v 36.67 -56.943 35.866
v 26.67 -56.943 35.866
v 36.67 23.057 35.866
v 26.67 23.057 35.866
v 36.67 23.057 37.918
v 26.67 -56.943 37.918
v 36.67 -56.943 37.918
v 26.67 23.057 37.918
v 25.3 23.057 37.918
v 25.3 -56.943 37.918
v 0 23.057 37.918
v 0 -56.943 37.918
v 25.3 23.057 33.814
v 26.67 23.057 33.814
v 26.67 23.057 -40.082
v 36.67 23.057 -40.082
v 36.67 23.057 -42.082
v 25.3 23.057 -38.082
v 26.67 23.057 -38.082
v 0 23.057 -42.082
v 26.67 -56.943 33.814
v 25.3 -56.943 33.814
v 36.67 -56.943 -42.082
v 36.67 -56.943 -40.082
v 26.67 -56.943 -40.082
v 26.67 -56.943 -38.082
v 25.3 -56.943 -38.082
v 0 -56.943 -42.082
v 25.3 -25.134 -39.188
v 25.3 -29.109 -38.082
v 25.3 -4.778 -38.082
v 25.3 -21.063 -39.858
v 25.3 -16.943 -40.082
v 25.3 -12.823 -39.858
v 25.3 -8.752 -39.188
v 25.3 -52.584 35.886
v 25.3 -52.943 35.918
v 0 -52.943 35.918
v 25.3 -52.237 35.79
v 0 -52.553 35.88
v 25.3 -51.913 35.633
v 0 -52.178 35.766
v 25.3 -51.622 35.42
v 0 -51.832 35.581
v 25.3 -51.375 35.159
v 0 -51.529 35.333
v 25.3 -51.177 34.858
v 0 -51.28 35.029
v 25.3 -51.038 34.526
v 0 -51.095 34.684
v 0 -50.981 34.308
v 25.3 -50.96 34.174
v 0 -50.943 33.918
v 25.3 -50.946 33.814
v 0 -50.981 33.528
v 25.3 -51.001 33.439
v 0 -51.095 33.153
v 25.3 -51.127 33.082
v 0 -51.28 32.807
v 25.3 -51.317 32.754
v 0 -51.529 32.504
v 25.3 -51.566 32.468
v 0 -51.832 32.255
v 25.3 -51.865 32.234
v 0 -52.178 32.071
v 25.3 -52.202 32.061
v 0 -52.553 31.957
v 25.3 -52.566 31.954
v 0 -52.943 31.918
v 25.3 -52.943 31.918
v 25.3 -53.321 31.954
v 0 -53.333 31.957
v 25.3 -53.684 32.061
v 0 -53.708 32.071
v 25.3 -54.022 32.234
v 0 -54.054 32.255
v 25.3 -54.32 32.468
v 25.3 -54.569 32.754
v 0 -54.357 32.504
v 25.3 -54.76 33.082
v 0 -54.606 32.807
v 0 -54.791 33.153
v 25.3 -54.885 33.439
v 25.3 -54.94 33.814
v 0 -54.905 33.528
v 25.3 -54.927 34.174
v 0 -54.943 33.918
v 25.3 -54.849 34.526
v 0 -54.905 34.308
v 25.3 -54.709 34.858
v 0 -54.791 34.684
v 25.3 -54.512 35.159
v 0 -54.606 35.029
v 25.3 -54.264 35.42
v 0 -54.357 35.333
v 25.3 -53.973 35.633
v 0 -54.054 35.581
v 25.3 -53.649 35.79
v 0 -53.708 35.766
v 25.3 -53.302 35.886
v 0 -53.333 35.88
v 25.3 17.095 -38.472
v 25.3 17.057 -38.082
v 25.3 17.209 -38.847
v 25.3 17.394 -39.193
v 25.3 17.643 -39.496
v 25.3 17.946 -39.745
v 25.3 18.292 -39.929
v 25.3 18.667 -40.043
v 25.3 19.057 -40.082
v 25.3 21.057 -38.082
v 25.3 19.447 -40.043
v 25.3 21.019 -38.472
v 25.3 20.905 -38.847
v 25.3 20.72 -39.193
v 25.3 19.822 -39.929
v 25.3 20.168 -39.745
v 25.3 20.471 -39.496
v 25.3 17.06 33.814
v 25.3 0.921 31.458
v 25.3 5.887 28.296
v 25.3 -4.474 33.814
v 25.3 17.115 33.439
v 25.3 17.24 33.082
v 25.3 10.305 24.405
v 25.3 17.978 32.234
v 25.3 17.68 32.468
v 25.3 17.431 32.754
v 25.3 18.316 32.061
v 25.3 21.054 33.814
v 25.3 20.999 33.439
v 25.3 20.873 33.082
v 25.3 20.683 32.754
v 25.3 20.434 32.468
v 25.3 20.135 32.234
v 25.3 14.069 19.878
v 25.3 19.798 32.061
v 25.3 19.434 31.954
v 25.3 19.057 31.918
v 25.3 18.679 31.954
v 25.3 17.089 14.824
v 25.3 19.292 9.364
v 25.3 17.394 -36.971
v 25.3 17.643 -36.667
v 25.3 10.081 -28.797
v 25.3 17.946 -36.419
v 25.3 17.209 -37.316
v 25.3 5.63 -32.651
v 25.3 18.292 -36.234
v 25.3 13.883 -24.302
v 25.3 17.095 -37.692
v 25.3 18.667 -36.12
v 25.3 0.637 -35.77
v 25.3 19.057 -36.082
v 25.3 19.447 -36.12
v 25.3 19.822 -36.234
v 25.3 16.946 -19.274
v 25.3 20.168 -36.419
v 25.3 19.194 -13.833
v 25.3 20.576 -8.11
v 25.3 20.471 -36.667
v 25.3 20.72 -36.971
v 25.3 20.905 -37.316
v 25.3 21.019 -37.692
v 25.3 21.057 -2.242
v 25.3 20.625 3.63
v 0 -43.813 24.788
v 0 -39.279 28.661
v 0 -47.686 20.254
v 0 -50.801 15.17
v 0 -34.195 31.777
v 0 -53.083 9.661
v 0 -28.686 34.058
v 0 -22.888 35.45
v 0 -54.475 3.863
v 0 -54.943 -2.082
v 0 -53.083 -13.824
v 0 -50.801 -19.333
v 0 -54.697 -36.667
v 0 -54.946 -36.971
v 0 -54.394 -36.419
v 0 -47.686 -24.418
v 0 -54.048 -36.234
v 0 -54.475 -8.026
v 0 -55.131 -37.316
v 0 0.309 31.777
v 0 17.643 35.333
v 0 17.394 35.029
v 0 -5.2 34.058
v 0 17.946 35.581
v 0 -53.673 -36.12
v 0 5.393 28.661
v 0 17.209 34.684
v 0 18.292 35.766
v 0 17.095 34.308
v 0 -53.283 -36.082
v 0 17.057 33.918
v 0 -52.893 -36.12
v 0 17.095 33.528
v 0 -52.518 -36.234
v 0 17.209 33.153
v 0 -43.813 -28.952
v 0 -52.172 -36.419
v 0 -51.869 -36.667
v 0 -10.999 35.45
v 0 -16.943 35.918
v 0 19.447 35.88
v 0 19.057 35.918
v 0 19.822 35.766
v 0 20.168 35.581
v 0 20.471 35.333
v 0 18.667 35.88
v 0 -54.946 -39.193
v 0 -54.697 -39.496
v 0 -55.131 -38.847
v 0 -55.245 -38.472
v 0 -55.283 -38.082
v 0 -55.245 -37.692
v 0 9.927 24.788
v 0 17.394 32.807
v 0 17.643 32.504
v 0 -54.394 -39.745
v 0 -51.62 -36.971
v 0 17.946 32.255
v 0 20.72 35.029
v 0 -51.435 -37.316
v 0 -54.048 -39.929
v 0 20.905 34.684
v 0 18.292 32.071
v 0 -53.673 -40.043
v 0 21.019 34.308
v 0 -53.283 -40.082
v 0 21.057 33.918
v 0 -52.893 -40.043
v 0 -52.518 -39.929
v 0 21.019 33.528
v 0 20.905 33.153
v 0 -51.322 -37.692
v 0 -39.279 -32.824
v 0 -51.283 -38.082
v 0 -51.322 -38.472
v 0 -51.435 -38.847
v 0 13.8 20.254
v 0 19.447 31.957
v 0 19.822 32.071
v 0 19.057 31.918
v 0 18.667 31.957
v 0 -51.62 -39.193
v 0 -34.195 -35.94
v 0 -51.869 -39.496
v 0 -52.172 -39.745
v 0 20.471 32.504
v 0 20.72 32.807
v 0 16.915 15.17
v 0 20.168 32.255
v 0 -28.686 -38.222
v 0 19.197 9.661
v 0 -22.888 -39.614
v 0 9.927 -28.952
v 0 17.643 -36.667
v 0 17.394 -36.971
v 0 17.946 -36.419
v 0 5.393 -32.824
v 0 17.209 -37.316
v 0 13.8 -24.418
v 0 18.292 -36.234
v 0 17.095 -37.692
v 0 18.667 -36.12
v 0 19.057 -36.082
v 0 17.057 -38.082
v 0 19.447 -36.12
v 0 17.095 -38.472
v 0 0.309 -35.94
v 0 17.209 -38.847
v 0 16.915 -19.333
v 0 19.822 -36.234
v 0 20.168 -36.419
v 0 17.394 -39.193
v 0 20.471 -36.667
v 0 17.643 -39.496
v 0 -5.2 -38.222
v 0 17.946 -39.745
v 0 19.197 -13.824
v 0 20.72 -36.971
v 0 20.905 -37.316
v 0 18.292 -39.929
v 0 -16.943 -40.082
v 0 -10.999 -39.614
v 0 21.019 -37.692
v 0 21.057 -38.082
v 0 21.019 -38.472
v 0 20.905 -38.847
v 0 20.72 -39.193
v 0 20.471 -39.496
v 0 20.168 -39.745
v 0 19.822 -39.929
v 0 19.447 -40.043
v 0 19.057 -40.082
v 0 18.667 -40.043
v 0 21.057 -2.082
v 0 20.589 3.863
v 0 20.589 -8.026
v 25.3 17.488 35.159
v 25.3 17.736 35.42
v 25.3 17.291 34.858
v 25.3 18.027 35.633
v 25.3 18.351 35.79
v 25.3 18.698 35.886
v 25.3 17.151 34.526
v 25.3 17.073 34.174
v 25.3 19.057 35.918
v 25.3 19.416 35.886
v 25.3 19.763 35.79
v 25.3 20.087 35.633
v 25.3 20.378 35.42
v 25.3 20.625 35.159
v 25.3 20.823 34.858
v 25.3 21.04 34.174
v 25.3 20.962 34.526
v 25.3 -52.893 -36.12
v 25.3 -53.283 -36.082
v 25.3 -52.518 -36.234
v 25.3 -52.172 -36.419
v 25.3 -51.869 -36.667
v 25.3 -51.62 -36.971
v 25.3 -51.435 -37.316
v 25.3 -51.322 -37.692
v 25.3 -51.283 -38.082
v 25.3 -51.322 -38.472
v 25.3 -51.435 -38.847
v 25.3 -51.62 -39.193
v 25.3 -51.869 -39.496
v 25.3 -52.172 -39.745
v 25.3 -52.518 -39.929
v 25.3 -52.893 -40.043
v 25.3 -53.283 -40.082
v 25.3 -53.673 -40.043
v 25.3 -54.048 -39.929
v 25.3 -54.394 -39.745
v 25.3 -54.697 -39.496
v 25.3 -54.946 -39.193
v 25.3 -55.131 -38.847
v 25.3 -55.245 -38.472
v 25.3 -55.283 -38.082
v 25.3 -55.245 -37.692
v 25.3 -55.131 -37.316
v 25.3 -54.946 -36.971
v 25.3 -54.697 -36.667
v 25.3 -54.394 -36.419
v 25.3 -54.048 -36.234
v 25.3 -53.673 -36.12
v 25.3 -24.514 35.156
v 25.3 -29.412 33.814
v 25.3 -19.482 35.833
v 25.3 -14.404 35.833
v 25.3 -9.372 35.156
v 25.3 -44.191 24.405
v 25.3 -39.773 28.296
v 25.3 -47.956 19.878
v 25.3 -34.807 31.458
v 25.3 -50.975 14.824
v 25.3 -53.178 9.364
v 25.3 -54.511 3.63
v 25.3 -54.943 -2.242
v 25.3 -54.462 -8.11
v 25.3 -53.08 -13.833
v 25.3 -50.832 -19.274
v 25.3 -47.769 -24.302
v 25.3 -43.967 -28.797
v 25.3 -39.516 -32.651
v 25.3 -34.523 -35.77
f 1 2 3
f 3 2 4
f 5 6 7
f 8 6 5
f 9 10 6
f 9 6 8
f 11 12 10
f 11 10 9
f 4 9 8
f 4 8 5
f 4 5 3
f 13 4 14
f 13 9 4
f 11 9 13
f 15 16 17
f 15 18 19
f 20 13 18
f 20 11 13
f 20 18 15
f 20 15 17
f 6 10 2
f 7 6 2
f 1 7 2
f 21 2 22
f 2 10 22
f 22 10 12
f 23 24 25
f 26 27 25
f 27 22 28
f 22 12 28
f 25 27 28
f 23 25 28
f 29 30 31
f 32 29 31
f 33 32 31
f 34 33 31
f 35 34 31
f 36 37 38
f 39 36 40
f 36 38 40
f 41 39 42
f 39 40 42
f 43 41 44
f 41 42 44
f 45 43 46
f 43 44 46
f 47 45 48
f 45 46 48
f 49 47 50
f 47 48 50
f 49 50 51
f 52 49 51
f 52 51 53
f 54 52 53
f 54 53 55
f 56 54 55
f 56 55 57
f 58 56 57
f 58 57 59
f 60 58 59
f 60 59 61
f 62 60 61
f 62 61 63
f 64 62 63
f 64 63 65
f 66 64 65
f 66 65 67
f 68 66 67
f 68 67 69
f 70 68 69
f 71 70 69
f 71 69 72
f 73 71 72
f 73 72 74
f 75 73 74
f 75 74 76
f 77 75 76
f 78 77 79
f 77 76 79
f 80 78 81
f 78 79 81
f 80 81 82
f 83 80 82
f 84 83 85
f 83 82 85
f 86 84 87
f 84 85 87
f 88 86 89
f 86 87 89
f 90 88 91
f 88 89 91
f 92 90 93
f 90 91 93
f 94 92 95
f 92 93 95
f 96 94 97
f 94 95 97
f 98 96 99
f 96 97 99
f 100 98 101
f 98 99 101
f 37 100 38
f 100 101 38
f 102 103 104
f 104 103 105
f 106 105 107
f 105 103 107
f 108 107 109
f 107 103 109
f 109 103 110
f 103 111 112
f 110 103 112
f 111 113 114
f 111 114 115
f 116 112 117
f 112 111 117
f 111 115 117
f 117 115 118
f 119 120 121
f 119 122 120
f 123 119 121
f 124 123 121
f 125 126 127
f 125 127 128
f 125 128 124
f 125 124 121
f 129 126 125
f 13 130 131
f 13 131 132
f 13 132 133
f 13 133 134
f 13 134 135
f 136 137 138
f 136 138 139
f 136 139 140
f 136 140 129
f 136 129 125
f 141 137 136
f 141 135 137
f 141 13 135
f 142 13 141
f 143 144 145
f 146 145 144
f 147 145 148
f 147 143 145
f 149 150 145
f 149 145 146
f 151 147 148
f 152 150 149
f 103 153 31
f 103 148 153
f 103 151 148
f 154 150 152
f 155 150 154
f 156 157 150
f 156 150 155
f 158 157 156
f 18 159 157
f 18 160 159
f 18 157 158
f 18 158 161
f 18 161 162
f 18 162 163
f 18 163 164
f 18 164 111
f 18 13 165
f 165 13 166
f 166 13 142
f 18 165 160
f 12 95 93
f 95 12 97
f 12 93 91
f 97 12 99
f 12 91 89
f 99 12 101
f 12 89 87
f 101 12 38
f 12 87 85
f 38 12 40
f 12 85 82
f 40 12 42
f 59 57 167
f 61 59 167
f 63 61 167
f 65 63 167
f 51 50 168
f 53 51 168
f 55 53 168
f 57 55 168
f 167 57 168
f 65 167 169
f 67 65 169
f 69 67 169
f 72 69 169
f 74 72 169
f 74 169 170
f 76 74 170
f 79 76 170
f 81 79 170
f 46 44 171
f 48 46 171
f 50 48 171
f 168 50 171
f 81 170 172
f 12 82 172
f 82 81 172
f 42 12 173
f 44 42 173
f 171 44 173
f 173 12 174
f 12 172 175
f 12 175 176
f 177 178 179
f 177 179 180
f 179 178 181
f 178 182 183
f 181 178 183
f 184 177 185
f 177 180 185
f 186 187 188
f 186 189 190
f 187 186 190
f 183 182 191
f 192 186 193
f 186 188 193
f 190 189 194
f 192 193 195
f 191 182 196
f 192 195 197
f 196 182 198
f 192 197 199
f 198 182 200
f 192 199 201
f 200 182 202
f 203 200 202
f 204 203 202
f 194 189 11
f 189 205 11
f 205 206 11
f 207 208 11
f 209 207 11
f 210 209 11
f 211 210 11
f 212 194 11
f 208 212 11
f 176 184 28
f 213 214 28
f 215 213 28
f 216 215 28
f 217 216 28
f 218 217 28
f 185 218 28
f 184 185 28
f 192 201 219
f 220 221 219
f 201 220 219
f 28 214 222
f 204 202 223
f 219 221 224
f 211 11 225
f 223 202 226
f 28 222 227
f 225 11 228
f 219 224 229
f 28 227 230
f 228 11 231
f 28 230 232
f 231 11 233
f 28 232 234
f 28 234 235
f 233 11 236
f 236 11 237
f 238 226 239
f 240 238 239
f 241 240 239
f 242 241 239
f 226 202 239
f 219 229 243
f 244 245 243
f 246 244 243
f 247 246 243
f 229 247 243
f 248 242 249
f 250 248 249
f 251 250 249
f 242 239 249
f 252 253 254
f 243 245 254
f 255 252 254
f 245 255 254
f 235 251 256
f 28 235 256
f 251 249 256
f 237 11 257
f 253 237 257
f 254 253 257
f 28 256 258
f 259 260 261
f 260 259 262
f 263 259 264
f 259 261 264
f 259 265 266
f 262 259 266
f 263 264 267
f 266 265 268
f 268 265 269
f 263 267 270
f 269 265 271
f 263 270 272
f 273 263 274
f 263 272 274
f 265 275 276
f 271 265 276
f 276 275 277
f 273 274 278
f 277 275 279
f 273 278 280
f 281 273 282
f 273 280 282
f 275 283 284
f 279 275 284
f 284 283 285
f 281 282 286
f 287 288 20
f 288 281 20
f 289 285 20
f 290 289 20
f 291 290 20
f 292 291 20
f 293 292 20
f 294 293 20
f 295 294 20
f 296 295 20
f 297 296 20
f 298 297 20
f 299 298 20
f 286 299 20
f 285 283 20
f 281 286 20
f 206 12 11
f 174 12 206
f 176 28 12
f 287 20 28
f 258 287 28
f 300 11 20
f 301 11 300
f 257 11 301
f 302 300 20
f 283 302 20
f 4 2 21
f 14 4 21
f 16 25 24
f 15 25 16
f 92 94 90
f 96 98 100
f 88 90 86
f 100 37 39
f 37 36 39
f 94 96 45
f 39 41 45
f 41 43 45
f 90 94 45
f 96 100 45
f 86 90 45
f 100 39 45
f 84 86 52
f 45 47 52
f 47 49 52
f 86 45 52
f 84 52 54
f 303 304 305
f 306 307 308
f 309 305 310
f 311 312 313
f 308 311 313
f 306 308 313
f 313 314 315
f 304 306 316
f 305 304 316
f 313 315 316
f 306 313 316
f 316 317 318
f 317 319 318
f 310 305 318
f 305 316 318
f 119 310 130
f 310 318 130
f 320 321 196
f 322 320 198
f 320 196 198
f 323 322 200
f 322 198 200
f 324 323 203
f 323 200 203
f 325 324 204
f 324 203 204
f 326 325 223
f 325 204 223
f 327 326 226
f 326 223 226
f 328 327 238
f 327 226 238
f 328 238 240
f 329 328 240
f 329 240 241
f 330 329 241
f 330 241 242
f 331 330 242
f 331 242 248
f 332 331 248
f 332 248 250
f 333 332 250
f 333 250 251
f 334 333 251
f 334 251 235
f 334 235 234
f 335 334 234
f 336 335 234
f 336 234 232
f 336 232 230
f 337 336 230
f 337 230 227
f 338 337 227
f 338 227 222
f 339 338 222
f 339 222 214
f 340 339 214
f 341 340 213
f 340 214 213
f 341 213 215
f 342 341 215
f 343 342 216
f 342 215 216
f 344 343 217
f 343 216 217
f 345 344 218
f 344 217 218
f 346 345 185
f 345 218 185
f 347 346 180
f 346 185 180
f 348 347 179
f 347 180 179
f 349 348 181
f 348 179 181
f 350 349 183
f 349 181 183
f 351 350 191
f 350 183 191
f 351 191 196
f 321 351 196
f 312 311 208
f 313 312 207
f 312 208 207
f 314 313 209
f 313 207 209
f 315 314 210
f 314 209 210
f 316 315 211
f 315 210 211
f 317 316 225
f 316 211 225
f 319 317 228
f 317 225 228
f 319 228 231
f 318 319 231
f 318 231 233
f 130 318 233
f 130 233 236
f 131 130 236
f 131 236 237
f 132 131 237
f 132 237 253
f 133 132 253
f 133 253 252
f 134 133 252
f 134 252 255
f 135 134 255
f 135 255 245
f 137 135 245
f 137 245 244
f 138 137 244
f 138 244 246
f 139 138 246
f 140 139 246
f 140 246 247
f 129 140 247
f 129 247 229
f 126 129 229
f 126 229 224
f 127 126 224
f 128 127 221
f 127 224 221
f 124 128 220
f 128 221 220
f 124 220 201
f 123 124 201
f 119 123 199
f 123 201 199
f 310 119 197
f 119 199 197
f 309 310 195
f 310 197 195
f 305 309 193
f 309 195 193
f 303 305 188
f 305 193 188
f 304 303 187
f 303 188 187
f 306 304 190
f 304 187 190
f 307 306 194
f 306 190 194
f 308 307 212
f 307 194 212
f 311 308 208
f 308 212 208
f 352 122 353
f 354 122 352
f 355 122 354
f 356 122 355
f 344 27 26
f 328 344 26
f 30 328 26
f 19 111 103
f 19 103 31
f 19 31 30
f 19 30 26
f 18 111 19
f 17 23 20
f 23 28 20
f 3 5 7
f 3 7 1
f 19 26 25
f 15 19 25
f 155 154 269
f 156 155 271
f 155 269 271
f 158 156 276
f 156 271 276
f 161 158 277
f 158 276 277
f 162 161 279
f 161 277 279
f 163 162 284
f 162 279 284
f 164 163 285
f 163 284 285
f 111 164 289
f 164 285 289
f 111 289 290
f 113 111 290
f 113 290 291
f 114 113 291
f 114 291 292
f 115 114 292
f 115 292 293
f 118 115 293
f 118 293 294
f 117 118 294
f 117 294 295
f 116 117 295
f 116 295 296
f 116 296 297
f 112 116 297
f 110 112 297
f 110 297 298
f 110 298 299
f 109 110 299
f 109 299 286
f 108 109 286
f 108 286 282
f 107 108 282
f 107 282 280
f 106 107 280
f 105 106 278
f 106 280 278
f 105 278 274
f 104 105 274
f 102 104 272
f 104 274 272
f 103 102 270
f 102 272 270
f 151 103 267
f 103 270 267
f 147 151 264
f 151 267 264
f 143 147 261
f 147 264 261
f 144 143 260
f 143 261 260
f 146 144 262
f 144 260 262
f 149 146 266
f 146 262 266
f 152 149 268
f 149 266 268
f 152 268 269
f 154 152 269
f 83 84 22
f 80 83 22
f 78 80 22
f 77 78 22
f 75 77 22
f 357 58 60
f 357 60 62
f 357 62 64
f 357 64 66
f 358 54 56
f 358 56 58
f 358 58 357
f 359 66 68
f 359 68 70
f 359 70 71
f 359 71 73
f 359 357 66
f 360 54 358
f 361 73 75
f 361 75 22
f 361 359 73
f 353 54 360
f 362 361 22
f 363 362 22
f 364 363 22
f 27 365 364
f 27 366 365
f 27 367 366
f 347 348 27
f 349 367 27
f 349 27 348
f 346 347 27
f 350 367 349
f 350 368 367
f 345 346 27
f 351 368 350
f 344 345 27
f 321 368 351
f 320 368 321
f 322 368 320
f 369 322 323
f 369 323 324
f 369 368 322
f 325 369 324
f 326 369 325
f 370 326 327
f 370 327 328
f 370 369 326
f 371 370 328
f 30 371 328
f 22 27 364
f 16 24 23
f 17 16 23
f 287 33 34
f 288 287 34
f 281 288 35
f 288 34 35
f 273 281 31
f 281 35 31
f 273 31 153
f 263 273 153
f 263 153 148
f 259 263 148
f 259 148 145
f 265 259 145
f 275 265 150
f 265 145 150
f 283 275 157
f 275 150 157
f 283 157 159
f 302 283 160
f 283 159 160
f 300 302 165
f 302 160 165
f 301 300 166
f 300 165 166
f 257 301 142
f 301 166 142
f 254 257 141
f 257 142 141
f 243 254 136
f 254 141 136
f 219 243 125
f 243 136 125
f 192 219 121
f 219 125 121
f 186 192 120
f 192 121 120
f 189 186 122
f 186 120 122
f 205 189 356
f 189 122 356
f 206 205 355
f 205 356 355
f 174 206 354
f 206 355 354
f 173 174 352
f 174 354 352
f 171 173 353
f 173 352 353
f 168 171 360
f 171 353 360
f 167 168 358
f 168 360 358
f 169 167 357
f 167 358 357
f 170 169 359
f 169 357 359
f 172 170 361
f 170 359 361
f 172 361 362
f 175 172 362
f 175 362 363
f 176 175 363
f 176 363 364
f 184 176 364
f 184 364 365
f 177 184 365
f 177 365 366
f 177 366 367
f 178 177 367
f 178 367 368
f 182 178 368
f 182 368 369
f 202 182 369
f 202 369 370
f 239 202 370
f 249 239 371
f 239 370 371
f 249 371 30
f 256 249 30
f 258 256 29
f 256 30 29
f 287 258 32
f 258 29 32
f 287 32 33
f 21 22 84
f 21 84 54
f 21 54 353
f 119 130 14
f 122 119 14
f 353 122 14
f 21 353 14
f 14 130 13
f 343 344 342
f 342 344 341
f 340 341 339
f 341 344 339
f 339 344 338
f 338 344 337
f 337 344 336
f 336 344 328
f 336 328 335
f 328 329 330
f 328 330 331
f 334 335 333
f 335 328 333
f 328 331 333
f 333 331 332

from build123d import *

# Parameters (mm, degrees)
SKETCH1_W           = 80
SKETCH1_H           = 80
BOSS_EXTRUDE1_DEPTH = 25.3
SKETCH2_R           = 38
CUT_EXTRUDE1_DEPTH  = 25.3
SKETCH4_R           = 2
CUT_EXTRUDE2_DEPTH  = 25.3
SKETCH9_R           = 2
CUT_EXTRUDE3_DEPTH  = 25.3
SKETCH10_W          = 4.103880803
SKETCH10_H          = 80
SKETCH10_W_2        = 4
BOSS_EXTRUDE2_DEPTH = 1.37
SKETCH11_W          = 2.051940402
SKETCH11_H          = 80
BOSS_EXTRUDE3_DEPTH = 10
SKETCH12_W          = 2
SKETCH12_H          = 80
BOSS_EXTRUDE4_DEPTH = 10


with BuildPart() as part:
    # Sketch1 → Boss-Extrude1 (new body)
    with BuildSketch(Plane(origin=(0, 0, 0), x_dir=(0, 0, -1), z_dir=(1, 0, 0))):
        with Locations((2.081688293, -16.943070175)):
            Rectangle(SKETCH1_W, SKETCH1_H)
    extrude(amount=BOSS_EXTRUDE1_DEPTH)

    # Sketch2 → Cut-Extrude1 (cut)
    with BuildSketch(Plane(origin=(25.3, 0, 0), x_dir=(0, 0, -1), z_dir=(1, 0, 0))):
        with Locations((2.081688293, -16.943070175)):
            Circle(SKETCH2_R)
    extrude(amount=-CUT_EXTRUDE1_DEPTH, mode=Mode.SUBTRACT)

    # Sketch4 → Cut-Extrude2 (cut)
    with BuildSketch(Plane.ZY):
        with Locations((-38.081688293, 19.056929825)):
            Circle(SKETCH4_R)
    extrude(amount=-CUT_EXTRUDE2_DEPTH, mode=Mode.SUBTRACT)

    # Sketch9 → Cut-Extrude3 (cut)
    with BuildSketch(Plane.ZY):
        with Locations((33.918311707, 19.056929825)):
            Circle(SKETCH9_R)
        with Locations((33.918311707, -52.943070175)):
            Circle(SKETCH9_R)
        with Locations((-38.081688293, -53.283129164)):
            Circle(SKETCH9_R)
    extrude(amount=-CUT_EXTRUDE3_DEPTH, mode=Mode.SUBTRACT)

    # Sketch10 → Boss-Extrude2 (add)
    with BuildSketch(Plane(origin=(25.3, 0, 0), x_dir=(0, 0, -1), z_dir=(1, 0, 0))):
        with Locations((-35.866371306, -16.943070175)):
            Rectangle(SKETCH10_W, SKETCH10_H)
        with Locations((40.081688293, -16.943070175)):
            Rectangle(SKETCH10_W_2, SKETCH10_H)
    extrude(amount=BOSS_EXTRUDE2_DEPTH)

    # Sketch11 → Boss-Extrude3 (add)
    with BuildSketch(Plane(origin=(26.67, 0, 0), x_dir=(0, 0, -1), z_dir=(1, 0, 0))):
        with Locations((-36.892341506, -16.943070175)):
            Rectangle(SKETCH11_W, SKETCH11_H)
    extrude(amount=BOSS_EXTRUDE3_DEPTH)

    # Sketch12 → Boss-Extrude4 (add)
    with BuildSketch(Plane(origin=(26.67, 0, 0), x_dir=(0, 0, -1), z_dir=(1, 0, 0))):
        with Locations((41.081688293, -16.943070175)):
            Rectangle(SKETCH12_W, SKETCH12_H)
    extrude(amount=BOSS_EXTRUDE4_DEPTH)


solid = part.part
